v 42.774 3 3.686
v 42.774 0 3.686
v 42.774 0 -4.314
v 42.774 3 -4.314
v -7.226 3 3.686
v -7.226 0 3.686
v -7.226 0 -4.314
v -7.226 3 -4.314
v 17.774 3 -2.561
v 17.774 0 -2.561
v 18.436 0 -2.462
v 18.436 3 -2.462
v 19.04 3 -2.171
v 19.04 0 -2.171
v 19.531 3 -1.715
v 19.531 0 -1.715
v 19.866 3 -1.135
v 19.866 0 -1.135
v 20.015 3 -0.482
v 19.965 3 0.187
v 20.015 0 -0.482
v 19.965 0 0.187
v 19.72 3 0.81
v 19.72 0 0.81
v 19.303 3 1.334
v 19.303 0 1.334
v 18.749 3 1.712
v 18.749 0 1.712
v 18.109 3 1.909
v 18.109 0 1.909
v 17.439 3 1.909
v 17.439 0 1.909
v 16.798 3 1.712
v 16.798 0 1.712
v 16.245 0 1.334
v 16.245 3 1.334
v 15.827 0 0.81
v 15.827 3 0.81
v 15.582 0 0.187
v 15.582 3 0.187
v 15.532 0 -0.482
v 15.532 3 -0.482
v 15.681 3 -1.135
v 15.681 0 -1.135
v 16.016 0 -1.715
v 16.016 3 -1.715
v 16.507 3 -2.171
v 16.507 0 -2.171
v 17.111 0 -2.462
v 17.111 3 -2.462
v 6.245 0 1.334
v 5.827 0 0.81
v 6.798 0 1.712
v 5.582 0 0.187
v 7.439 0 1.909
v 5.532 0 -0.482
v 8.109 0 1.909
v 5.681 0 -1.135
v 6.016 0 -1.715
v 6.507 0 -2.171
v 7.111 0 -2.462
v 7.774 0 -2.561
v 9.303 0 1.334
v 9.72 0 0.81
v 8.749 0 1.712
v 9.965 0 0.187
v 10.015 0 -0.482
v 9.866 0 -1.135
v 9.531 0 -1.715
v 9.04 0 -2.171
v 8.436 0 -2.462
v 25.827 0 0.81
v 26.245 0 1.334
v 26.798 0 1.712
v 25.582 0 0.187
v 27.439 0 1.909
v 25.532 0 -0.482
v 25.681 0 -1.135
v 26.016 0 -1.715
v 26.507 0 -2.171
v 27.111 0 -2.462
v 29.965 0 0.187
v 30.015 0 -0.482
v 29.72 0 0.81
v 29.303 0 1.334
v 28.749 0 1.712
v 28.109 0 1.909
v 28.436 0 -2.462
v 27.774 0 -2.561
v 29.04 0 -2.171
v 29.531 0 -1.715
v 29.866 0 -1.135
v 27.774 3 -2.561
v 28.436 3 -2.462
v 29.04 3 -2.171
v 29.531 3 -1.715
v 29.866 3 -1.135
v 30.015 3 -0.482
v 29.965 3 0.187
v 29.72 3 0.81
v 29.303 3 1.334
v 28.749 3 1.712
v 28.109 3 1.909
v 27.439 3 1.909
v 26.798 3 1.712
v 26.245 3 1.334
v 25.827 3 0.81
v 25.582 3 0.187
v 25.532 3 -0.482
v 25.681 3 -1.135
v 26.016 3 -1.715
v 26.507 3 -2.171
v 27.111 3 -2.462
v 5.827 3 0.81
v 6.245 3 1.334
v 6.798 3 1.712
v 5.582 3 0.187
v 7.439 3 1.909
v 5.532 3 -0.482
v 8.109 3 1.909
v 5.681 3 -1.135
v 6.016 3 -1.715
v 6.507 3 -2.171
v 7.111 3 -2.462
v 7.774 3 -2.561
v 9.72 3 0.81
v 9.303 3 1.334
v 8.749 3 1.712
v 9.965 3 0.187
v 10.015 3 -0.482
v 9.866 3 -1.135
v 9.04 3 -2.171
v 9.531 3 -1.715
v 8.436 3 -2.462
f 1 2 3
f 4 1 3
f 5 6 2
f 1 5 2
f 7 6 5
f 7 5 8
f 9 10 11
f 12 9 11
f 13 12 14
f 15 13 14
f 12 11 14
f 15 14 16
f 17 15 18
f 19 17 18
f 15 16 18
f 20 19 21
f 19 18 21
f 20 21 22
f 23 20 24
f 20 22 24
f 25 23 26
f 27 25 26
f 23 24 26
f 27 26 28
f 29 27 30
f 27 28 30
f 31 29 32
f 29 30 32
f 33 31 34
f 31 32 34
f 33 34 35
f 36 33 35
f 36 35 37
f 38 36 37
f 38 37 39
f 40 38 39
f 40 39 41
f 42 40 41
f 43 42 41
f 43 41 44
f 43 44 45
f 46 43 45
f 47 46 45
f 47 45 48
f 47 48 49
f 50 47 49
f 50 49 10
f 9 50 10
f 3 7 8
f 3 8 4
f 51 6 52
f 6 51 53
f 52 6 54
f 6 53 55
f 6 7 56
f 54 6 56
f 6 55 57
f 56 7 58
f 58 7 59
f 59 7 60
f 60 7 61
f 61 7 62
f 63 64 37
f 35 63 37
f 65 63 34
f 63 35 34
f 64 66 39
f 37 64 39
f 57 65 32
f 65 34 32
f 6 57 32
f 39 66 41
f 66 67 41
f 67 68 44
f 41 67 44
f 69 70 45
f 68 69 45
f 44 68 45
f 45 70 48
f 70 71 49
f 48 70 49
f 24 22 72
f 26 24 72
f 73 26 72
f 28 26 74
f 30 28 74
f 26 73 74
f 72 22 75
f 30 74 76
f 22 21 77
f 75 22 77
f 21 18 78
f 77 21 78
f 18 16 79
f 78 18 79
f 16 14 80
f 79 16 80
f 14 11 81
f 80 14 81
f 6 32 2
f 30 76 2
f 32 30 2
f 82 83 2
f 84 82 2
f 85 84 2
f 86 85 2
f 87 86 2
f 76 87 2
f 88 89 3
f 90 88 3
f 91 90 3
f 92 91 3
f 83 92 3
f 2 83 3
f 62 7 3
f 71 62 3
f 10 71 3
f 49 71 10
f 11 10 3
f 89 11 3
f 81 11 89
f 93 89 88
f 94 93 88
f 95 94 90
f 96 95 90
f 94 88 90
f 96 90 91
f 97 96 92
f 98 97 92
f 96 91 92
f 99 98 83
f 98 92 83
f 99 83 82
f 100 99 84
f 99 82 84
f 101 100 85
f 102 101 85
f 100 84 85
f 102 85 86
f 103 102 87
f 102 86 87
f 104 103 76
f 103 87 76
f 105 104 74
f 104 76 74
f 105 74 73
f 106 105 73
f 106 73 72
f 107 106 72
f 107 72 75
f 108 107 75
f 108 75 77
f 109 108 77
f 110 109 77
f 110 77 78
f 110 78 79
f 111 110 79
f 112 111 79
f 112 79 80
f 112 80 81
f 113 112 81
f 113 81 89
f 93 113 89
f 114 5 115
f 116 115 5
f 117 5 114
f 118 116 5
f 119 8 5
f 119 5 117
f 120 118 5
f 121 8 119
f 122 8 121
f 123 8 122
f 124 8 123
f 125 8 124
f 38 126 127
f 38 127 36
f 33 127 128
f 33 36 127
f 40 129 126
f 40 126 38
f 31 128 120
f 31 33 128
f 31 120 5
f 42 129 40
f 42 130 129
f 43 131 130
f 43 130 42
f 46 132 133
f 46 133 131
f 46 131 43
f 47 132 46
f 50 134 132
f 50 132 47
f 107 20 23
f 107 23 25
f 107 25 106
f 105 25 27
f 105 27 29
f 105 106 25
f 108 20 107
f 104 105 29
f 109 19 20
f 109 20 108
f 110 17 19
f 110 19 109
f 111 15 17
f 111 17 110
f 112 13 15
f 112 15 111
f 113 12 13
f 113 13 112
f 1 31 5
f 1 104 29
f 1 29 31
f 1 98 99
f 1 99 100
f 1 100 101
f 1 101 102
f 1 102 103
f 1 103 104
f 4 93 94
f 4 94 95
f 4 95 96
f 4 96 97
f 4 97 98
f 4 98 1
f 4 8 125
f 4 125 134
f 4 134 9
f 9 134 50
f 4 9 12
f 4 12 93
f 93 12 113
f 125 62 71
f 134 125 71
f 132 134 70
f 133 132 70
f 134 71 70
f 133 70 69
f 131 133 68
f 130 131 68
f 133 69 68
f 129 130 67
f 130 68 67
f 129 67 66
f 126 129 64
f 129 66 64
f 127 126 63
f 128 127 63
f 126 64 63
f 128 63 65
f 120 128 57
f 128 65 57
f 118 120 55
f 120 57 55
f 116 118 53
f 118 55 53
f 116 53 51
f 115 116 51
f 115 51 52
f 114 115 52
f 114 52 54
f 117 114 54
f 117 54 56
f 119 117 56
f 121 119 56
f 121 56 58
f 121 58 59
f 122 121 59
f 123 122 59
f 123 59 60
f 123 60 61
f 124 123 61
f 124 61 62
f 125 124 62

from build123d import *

# Parameters (mm, degrees)
SKETCH1_W                 = 50
SKETCH1_H                 = 8
BOSS_EXTRUDE1_DEPTH       = 3
F_8_CLEARANCE_HOLE1_D     = 4.4958
F_8_CLEARANCE_HOLE1_DEPTH = 17
F_8_CLEARANCE_HOLE1_TIP   = 1.350674586


with BuildPart() as part:
    # Sketch1 → Boss-Extrude1 (new body)
    with BuildSketch(Plane(origin=(0, 0, 0), x_dir=(1, 0, 0), z_dir=(0, 1, 0))):
        with Locations((17.773632998, 0.313559322)):
            Rectangle(SKETCH1_W, SKETCH1_H)
    extrude(amount=BOSS_EXTRUDE1_DEPTH)

    # #8 Clearance Hole1
    with Locations(Plane(origin=(7.773632998, 3, -0.313559322), x_dir=(0, 0, 1), z_dir=(0, 1, 0))):
        with Locations((0, 0), (0, 20), (0, 10)):
            Hole(F_8_CLEARANCE_HOLE1_D / 2, depth=F_8_CLEARANCE_HOLE1_DEPTH)
            with Locations((0, 0, -(F_8_CLEARANCE_HOLE1_DEPTH + F_8_CLEARANCE_HOLE1_TIP / 2))):  # 118° drill point
                Cone(0, F_8_CLEARANCE_HOLE1_D / 2, F_8_CLEARANCE_HOLE1_TIP, mode=Mode.SUBTRACT)


solid = part.part
